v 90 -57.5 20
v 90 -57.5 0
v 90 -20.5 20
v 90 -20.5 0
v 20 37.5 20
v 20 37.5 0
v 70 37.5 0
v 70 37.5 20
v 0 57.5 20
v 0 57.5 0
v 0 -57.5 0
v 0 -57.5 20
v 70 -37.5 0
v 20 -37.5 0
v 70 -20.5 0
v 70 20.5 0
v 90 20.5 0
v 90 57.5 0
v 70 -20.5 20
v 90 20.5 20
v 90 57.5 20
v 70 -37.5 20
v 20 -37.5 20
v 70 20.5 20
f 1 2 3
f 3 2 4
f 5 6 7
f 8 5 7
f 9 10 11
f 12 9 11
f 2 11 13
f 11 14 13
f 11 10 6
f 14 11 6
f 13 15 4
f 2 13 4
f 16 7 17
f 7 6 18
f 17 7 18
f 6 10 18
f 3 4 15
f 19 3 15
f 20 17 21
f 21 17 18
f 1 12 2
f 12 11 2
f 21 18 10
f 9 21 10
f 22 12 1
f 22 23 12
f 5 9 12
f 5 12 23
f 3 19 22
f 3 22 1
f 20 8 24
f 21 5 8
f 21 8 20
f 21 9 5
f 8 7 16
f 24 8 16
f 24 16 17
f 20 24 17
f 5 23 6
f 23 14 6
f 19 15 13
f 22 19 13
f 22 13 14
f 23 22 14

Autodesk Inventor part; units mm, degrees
ref_plane "YZ Plane" through (0, 0, 0) normal (1, 0, 0) x (0, 1, 0)
ref_plane "XZ Plane" through (0, 0, 0) normal (0, 1, 0) x (-1, 0, 0)
ref_plane "XY Plane" through (0, 0, 0) normal (0, 0, 1) x (1, 0, 0)
sketch "Sketch1" plane through (0, 0, 0) normal (0, 0, 1) x (1, 0, 0)
  point P0 (0, 0)
sketch "LAYER1" plane through (0, 0, 0) normal (0, 0, 1) x (1, 0, 0)
  line L0 (70, 20.5) -> (90, 20.5)
  line L1 (90, 20.5) -> (90, 57.5)
  line L2 (90, 57.5) -> (0, 57.5)
  line L3 (0, 57.5) -> (0, -57.5)
  line L4 (0, -57.5) -> (90, -57.5)
  line L5 (90, -57.5) -> (90, -20.5)
  line L6 (90, -20.5) -> (70, -20.5)
  line L7 (70, -20.5) -> (70, -37.5)
  line L8 (70, -37.5) -> (20, -37.5)
  line L9 (20, -37.5) -> (20, 37.5)
  line L10 (20, 37.5) -> (70, 37.5)
  line L11 (70, 37.5) -> (70, 20.5)
sketch "LAYER2" plane through (0, 0, 0) normal (0, 0, 1) x (1, 0, 0)
  line L0 (20.1, -20) -> (110.1, -20)
  line L1 (110.1, -20) -> (110.1, 20)
  line L2 (110.1, 20) -> (20.1, 20)
  line L3 (20.1, 20) -> (20.1, -20)
sketch "LAYER3" plane through (0, 0, 0) normal (0, 0, 1) x (1, 0, 0)
  line L0 (20.5, -71.2) -> (69.5, -71.2)
  line L1 (69.5, -71.2) -> (69.5, -58)
  line L2 (69.5, -58) -> (20.5, -58)
  line L3 (20.5, -58) -> (20.5, -71.2)
sketch "LAYER4" plane through (0, 0, 0) normal (0, 0, 1) x (1, 0, 0)
  line L0 (20.5, -23.8) -> (69.5, -23.8)
  line L1 (69.5, -23.8) -> (69.5, -37)
  line L2 (69.5, -37) -> (20.5, -37)
  line L3 (20.5, -37) -> (20.5, -23.8)
sketch "LAYER5" plane through (0, 0, 0) normal (0, 0, 1) x (1, 0, 0)
  line L0 (20.5, 23.8) -> (69.5, 23.8)
  line L1 (69.5, 23.8) -> (69.5, 37)
  line L2 (69.5, 37) -> (20.5, 37)
  line L3 (20.5, 37) -> (20.5, 23.8)
sketch "LAYER6" plane through (0, 0, 0) normal (0, 0, 1) x (1, 0, 0)
  line L0 (20.5, 71.2) -> (69.5, 71.2)
  line L1 (69.5, 71.2) -> (69.5, 58)
  line L2 (69.5, 58) -> (20.5, 58)
  line L3 (20.5, 58) -> (20.5, 71.2)
extrude "Extrusion1" add sketch "LAYER1" along normal blind 20
properties part number "Core"
